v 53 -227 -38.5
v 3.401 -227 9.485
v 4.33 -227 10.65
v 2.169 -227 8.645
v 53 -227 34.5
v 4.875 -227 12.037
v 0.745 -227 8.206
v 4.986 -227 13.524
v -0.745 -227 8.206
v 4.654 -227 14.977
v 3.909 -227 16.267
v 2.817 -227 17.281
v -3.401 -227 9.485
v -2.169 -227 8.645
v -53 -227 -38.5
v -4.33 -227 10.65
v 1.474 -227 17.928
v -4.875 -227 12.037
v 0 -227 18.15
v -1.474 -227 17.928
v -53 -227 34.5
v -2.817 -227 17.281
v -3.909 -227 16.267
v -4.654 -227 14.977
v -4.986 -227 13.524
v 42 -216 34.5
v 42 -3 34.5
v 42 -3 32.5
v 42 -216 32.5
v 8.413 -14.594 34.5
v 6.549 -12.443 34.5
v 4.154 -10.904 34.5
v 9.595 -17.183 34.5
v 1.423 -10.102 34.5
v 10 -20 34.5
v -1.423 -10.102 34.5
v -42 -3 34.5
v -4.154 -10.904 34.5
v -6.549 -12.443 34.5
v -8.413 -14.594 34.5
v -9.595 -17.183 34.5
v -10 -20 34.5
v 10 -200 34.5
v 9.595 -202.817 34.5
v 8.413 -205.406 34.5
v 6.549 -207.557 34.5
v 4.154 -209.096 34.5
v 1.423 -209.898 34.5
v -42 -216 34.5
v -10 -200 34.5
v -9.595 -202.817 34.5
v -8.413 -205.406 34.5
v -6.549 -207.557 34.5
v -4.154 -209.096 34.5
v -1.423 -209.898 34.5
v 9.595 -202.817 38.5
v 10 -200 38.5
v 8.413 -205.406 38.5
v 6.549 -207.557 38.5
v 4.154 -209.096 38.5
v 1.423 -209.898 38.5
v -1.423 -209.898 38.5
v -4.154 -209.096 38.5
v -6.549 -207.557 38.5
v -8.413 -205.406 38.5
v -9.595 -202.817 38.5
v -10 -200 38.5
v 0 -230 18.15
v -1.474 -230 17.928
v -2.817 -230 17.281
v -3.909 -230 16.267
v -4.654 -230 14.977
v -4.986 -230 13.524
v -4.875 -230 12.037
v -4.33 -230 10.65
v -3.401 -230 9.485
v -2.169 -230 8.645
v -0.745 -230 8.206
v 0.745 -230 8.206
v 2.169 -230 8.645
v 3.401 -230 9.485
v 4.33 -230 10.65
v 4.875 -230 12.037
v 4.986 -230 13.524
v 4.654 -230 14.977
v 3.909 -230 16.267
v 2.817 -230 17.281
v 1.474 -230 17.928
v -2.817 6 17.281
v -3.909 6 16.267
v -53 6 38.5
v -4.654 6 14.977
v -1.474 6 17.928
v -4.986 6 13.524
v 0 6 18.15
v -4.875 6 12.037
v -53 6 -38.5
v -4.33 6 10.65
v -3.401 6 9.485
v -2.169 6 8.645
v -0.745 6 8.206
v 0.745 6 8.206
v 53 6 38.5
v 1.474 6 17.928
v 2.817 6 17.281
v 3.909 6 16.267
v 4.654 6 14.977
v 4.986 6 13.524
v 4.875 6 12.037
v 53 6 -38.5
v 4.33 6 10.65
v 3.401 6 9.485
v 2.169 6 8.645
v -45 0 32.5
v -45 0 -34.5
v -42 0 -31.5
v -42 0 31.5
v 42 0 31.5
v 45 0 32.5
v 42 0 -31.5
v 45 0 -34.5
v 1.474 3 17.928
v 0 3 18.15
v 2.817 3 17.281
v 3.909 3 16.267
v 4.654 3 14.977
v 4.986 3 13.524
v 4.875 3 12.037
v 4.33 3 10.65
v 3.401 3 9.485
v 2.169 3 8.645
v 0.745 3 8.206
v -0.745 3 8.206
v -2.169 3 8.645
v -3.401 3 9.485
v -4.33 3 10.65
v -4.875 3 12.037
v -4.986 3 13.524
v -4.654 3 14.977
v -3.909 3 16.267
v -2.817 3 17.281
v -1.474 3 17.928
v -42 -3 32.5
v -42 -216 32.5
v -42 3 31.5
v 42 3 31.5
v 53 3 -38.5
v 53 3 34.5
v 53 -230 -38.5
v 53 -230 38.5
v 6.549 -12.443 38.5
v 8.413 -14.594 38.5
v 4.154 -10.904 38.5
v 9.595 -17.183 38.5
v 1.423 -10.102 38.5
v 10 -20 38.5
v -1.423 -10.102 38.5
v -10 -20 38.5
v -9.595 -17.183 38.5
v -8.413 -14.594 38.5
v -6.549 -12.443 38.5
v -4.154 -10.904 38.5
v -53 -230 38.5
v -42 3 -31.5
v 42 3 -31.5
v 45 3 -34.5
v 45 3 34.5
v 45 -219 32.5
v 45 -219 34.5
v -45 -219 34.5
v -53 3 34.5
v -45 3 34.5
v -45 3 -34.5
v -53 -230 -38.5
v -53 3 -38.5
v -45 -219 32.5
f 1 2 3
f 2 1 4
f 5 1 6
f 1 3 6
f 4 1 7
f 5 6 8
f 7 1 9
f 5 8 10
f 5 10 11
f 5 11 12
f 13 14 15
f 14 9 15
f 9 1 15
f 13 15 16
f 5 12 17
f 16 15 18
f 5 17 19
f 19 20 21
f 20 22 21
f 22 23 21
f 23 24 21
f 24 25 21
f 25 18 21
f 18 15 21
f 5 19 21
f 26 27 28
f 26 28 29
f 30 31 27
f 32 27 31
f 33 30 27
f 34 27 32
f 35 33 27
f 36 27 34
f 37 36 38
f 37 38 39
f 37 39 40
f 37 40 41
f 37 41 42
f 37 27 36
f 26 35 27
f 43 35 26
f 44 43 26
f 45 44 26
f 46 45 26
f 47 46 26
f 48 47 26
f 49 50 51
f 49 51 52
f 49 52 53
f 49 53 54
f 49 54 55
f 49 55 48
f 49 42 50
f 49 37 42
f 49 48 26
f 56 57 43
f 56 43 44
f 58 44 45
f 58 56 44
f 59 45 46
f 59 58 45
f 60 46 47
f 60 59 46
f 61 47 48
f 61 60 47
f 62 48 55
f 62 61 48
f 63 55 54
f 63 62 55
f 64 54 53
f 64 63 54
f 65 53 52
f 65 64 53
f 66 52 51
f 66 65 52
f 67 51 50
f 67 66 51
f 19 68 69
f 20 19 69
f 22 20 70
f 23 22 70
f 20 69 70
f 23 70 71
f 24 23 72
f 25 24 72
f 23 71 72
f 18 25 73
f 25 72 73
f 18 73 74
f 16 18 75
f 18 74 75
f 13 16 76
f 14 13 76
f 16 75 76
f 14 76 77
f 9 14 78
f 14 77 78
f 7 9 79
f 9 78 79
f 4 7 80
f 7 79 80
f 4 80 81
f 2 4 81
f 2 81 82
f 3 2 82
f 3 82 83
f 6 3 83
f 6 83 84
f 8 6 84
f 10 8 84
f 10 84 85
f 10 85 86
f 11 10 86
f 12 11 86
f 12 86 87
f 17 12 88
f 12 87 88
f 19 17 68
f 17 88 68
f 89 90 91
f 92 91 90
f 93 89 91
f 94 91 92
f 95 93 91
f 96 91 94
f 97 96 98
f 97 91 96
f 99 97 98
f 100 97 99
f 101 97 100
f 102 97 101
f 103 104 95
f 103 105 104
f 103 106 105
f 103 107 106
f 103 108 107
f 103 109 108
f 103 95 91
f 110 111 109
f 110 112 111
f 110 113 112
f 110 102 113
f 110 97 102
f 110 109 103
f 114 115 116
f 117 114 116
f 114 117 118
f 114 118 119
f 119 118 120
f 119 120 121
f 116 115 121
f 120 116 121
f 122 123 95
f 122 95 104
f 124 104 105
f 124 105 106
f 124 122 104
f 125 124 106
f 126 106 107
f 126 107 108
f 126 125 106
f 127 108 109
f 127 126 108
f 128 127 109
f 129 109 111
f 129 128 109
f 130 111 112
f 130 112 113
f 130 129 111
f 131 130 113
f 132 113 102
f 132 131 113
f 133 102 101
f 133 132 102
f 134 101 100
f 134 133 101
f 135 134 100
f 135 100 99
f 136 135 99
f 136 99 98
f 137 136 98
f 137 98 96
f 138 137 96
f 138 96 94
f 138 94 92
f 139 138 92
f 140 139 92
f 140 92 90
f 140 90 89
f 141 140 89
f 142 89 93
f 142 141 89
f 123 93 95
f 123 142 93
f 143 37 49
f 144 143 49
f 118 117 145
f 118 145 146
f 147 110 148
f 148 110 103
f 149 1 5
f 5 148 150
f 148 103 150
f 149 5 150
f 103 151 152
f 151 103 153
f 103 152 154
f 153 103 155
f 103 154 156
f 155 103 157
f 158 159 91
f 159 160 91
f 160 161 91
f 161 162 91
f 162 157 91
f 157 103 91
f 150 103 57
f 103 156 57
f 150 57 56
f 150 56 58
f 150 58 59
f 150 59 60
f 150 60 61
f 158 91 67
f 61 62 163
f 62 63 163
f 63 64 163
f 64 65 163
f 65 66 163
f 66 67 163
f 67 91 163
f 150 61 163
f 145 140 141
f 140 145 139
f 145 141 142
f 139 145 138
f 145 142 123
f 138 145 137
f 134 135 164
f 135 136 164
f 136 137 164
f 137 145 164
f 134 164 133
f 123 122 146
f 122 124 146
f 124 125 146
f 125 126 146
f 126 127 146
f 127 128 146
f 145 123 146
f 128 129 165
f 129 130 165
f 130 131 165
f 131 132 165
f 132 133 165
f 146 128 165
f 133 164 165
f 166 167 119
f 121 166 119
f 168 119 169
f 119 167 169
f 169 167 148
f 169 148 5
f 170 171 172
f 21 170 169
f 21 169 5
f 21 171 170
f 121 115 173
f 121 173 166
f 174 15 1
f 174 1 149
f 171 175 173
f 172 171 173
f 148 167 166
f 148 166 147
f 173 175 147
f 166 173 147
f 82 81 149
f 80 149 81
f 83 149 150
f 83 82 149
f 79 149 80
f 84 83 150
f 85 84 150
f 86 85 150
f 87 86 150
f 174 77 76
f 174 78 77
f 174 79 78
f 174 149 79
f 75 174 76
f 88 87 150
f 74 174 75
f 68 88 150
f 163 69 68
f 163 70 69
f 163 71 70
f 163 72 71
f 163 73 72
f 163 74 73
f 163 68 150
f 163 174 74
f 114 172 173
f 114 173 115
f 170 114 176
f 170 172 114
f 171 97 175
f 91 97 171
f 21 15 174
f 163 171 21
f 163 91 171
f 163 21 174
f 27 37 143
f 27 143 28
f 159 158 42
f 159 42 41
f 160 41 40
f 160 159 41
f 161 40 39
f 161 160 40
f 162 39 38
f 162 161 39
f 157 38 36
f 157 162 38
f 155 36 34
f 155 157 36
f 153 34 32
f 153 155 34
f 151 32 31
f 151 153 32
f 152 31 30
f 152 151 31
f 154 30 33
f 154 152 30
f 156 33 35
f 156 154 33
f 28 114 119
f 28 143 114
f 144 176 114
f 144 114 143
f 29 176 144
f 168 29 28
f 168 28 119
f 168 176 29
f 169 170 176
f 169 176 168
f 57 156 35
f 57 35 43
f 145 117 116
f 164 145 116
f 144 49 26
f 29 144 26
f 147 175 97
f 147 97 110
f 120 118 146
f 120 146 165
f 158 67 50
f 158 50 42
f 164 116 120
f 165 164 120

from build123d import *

# Parameters (mm, degrees)
SKETCH1_W           = 90
SKETCH1_H           = 69
SKETCH1_W_2         = 84
SKETCH1_H_2         = 63
BOSS_EXTRUDE1_DEPTH = 3
SKETCH2_W           = 106
SKETCH2_H           = 77
SKETCH2_R           = 5
BOSS_EXTRUDE3_DEPTH = 3
SKETCH3_W           = 230
SKETCH3_H           = 4
BOSS_EXTRUDE4_DEPTH = 106
SKETCH4_W           = 90
SKETCH4_H           = 219
SKETCH4_W_2         = 84
SKETCH4_H_2         = 213
BOSS_EXTRUDE5_DEPTH = 2
SKETCH5_W           = 3
SKETCH5_H           = 77
BOSS_EXTRUDE6_DEPTH = 106
SKETCH6_R           = 5
CUT_EXTRUDE1_DEPTH  = 3
CUT_EXTRUDE2_DEPTH  = 249.270014299


with BuildPart() as part:
    # Sketch1 → Boss-Extrude1 (new body)
    with BuildSketch(Plane(origin=(0, 0, 0), x_dir=(1, 0, 0), z_dir=(0, 1, 0))):
        Rectangle(SKETCH1_W, SKETCH1_H)
        Rectangle(SKETCH1_W_2, SKETCH1_H_2, mode=Mode.SUBTRACT)
    extrude(amount=BOSS_EXTRUDE1_DEPTH)

    # Sketch2 → Boss-Extrude3 (add)
    with BuildSketch(Plane(origin=(0, 3, 0), x_dir=(1, 0, 0), z_dir=(0, 1, 0))):
        Rectangle(SKETCH2_W, SKETCH2_H)
        with Locations(Location((0, -13.15, 0), (0, 0, 270))):
            Circle(SKETCH2_R, mode=Mode.SUBTRACT)
    extrude(amount=BOSS_EXTRUDE3_DEPTH)

    # Sketch3 → Boss-Extrude4 (add)
    with BuildSketch(Plane(origin=(-53, 0, 0), x_dir=(0, -1, 0), z_dir=(-1, 0, 0))):
        with Locations((112, 36.5)):
            Rectangle(SKETCH3_W, SKETCH3_H)
    extrude(amount=-BOSS_EXTRUDE4_DEPTH)

    # Sketch4 → Boss-Extrude5 (add)
    with BuildSketch(Plane(origin=(0, 0, 34.5), x_dir=(1, 0, 0), z_dir=(0, 0, -1))):
        with Locations((0, 109.5)):
            Rectangle(SKETCH4_W, SKETCH4_H)
        with Locations((0, 109.5)):
            Rectangle(SKETCH4_W_2, SKETCH4_H_2, mode=Mode.SUBTRACT)
    extrude(amount=BOSS_EXTRUDE5_DEPTH)

    # Sketch5 → Boss-Extrude6 (add)
    with BuildSketch(Plane(origin=(-53, 0, 0), x_dir=(0, -1, 0), z_dir=(-1, 0, 0))):
        with Locations((228.5, 0)):
            Rectangle(SKETCH5_W, SKETCH5_H)
    extrude(amount=-BOSS_EXTRUDE6_DEPTH)

    # Sketch6 → Cut-Extrude1 (cut)
    with BuildSketch(Plane.XZ.offset(230)):
        with Locations(Location((0, 13.15, 0), (0, 0, 90))):
            Circle(SKETCH6_R)
    extrude(amount=-CUT_EXTRUDE1_DEPTH, mode=Mode.SUBTRACT)

    # Sketch7 → Cut-Extrude2 (cut, through all)
    with BuildSketch(Plane.XY.offset(38.5)):
        with BuildLine():
            Line((10, -20), (10, -200))
            ThreePointArc((10, -200), (0, -210), (-10, -200))
            Line((-10, -200), (-10, -20))
            ThreePointArc((-10, -20), (0, -10), (10, -20))
        make_face()
    extrude(amount=-CUT_EXTRUDE2_DEPTH, mode=Mode.SUBTRACT)


solid = part.part
